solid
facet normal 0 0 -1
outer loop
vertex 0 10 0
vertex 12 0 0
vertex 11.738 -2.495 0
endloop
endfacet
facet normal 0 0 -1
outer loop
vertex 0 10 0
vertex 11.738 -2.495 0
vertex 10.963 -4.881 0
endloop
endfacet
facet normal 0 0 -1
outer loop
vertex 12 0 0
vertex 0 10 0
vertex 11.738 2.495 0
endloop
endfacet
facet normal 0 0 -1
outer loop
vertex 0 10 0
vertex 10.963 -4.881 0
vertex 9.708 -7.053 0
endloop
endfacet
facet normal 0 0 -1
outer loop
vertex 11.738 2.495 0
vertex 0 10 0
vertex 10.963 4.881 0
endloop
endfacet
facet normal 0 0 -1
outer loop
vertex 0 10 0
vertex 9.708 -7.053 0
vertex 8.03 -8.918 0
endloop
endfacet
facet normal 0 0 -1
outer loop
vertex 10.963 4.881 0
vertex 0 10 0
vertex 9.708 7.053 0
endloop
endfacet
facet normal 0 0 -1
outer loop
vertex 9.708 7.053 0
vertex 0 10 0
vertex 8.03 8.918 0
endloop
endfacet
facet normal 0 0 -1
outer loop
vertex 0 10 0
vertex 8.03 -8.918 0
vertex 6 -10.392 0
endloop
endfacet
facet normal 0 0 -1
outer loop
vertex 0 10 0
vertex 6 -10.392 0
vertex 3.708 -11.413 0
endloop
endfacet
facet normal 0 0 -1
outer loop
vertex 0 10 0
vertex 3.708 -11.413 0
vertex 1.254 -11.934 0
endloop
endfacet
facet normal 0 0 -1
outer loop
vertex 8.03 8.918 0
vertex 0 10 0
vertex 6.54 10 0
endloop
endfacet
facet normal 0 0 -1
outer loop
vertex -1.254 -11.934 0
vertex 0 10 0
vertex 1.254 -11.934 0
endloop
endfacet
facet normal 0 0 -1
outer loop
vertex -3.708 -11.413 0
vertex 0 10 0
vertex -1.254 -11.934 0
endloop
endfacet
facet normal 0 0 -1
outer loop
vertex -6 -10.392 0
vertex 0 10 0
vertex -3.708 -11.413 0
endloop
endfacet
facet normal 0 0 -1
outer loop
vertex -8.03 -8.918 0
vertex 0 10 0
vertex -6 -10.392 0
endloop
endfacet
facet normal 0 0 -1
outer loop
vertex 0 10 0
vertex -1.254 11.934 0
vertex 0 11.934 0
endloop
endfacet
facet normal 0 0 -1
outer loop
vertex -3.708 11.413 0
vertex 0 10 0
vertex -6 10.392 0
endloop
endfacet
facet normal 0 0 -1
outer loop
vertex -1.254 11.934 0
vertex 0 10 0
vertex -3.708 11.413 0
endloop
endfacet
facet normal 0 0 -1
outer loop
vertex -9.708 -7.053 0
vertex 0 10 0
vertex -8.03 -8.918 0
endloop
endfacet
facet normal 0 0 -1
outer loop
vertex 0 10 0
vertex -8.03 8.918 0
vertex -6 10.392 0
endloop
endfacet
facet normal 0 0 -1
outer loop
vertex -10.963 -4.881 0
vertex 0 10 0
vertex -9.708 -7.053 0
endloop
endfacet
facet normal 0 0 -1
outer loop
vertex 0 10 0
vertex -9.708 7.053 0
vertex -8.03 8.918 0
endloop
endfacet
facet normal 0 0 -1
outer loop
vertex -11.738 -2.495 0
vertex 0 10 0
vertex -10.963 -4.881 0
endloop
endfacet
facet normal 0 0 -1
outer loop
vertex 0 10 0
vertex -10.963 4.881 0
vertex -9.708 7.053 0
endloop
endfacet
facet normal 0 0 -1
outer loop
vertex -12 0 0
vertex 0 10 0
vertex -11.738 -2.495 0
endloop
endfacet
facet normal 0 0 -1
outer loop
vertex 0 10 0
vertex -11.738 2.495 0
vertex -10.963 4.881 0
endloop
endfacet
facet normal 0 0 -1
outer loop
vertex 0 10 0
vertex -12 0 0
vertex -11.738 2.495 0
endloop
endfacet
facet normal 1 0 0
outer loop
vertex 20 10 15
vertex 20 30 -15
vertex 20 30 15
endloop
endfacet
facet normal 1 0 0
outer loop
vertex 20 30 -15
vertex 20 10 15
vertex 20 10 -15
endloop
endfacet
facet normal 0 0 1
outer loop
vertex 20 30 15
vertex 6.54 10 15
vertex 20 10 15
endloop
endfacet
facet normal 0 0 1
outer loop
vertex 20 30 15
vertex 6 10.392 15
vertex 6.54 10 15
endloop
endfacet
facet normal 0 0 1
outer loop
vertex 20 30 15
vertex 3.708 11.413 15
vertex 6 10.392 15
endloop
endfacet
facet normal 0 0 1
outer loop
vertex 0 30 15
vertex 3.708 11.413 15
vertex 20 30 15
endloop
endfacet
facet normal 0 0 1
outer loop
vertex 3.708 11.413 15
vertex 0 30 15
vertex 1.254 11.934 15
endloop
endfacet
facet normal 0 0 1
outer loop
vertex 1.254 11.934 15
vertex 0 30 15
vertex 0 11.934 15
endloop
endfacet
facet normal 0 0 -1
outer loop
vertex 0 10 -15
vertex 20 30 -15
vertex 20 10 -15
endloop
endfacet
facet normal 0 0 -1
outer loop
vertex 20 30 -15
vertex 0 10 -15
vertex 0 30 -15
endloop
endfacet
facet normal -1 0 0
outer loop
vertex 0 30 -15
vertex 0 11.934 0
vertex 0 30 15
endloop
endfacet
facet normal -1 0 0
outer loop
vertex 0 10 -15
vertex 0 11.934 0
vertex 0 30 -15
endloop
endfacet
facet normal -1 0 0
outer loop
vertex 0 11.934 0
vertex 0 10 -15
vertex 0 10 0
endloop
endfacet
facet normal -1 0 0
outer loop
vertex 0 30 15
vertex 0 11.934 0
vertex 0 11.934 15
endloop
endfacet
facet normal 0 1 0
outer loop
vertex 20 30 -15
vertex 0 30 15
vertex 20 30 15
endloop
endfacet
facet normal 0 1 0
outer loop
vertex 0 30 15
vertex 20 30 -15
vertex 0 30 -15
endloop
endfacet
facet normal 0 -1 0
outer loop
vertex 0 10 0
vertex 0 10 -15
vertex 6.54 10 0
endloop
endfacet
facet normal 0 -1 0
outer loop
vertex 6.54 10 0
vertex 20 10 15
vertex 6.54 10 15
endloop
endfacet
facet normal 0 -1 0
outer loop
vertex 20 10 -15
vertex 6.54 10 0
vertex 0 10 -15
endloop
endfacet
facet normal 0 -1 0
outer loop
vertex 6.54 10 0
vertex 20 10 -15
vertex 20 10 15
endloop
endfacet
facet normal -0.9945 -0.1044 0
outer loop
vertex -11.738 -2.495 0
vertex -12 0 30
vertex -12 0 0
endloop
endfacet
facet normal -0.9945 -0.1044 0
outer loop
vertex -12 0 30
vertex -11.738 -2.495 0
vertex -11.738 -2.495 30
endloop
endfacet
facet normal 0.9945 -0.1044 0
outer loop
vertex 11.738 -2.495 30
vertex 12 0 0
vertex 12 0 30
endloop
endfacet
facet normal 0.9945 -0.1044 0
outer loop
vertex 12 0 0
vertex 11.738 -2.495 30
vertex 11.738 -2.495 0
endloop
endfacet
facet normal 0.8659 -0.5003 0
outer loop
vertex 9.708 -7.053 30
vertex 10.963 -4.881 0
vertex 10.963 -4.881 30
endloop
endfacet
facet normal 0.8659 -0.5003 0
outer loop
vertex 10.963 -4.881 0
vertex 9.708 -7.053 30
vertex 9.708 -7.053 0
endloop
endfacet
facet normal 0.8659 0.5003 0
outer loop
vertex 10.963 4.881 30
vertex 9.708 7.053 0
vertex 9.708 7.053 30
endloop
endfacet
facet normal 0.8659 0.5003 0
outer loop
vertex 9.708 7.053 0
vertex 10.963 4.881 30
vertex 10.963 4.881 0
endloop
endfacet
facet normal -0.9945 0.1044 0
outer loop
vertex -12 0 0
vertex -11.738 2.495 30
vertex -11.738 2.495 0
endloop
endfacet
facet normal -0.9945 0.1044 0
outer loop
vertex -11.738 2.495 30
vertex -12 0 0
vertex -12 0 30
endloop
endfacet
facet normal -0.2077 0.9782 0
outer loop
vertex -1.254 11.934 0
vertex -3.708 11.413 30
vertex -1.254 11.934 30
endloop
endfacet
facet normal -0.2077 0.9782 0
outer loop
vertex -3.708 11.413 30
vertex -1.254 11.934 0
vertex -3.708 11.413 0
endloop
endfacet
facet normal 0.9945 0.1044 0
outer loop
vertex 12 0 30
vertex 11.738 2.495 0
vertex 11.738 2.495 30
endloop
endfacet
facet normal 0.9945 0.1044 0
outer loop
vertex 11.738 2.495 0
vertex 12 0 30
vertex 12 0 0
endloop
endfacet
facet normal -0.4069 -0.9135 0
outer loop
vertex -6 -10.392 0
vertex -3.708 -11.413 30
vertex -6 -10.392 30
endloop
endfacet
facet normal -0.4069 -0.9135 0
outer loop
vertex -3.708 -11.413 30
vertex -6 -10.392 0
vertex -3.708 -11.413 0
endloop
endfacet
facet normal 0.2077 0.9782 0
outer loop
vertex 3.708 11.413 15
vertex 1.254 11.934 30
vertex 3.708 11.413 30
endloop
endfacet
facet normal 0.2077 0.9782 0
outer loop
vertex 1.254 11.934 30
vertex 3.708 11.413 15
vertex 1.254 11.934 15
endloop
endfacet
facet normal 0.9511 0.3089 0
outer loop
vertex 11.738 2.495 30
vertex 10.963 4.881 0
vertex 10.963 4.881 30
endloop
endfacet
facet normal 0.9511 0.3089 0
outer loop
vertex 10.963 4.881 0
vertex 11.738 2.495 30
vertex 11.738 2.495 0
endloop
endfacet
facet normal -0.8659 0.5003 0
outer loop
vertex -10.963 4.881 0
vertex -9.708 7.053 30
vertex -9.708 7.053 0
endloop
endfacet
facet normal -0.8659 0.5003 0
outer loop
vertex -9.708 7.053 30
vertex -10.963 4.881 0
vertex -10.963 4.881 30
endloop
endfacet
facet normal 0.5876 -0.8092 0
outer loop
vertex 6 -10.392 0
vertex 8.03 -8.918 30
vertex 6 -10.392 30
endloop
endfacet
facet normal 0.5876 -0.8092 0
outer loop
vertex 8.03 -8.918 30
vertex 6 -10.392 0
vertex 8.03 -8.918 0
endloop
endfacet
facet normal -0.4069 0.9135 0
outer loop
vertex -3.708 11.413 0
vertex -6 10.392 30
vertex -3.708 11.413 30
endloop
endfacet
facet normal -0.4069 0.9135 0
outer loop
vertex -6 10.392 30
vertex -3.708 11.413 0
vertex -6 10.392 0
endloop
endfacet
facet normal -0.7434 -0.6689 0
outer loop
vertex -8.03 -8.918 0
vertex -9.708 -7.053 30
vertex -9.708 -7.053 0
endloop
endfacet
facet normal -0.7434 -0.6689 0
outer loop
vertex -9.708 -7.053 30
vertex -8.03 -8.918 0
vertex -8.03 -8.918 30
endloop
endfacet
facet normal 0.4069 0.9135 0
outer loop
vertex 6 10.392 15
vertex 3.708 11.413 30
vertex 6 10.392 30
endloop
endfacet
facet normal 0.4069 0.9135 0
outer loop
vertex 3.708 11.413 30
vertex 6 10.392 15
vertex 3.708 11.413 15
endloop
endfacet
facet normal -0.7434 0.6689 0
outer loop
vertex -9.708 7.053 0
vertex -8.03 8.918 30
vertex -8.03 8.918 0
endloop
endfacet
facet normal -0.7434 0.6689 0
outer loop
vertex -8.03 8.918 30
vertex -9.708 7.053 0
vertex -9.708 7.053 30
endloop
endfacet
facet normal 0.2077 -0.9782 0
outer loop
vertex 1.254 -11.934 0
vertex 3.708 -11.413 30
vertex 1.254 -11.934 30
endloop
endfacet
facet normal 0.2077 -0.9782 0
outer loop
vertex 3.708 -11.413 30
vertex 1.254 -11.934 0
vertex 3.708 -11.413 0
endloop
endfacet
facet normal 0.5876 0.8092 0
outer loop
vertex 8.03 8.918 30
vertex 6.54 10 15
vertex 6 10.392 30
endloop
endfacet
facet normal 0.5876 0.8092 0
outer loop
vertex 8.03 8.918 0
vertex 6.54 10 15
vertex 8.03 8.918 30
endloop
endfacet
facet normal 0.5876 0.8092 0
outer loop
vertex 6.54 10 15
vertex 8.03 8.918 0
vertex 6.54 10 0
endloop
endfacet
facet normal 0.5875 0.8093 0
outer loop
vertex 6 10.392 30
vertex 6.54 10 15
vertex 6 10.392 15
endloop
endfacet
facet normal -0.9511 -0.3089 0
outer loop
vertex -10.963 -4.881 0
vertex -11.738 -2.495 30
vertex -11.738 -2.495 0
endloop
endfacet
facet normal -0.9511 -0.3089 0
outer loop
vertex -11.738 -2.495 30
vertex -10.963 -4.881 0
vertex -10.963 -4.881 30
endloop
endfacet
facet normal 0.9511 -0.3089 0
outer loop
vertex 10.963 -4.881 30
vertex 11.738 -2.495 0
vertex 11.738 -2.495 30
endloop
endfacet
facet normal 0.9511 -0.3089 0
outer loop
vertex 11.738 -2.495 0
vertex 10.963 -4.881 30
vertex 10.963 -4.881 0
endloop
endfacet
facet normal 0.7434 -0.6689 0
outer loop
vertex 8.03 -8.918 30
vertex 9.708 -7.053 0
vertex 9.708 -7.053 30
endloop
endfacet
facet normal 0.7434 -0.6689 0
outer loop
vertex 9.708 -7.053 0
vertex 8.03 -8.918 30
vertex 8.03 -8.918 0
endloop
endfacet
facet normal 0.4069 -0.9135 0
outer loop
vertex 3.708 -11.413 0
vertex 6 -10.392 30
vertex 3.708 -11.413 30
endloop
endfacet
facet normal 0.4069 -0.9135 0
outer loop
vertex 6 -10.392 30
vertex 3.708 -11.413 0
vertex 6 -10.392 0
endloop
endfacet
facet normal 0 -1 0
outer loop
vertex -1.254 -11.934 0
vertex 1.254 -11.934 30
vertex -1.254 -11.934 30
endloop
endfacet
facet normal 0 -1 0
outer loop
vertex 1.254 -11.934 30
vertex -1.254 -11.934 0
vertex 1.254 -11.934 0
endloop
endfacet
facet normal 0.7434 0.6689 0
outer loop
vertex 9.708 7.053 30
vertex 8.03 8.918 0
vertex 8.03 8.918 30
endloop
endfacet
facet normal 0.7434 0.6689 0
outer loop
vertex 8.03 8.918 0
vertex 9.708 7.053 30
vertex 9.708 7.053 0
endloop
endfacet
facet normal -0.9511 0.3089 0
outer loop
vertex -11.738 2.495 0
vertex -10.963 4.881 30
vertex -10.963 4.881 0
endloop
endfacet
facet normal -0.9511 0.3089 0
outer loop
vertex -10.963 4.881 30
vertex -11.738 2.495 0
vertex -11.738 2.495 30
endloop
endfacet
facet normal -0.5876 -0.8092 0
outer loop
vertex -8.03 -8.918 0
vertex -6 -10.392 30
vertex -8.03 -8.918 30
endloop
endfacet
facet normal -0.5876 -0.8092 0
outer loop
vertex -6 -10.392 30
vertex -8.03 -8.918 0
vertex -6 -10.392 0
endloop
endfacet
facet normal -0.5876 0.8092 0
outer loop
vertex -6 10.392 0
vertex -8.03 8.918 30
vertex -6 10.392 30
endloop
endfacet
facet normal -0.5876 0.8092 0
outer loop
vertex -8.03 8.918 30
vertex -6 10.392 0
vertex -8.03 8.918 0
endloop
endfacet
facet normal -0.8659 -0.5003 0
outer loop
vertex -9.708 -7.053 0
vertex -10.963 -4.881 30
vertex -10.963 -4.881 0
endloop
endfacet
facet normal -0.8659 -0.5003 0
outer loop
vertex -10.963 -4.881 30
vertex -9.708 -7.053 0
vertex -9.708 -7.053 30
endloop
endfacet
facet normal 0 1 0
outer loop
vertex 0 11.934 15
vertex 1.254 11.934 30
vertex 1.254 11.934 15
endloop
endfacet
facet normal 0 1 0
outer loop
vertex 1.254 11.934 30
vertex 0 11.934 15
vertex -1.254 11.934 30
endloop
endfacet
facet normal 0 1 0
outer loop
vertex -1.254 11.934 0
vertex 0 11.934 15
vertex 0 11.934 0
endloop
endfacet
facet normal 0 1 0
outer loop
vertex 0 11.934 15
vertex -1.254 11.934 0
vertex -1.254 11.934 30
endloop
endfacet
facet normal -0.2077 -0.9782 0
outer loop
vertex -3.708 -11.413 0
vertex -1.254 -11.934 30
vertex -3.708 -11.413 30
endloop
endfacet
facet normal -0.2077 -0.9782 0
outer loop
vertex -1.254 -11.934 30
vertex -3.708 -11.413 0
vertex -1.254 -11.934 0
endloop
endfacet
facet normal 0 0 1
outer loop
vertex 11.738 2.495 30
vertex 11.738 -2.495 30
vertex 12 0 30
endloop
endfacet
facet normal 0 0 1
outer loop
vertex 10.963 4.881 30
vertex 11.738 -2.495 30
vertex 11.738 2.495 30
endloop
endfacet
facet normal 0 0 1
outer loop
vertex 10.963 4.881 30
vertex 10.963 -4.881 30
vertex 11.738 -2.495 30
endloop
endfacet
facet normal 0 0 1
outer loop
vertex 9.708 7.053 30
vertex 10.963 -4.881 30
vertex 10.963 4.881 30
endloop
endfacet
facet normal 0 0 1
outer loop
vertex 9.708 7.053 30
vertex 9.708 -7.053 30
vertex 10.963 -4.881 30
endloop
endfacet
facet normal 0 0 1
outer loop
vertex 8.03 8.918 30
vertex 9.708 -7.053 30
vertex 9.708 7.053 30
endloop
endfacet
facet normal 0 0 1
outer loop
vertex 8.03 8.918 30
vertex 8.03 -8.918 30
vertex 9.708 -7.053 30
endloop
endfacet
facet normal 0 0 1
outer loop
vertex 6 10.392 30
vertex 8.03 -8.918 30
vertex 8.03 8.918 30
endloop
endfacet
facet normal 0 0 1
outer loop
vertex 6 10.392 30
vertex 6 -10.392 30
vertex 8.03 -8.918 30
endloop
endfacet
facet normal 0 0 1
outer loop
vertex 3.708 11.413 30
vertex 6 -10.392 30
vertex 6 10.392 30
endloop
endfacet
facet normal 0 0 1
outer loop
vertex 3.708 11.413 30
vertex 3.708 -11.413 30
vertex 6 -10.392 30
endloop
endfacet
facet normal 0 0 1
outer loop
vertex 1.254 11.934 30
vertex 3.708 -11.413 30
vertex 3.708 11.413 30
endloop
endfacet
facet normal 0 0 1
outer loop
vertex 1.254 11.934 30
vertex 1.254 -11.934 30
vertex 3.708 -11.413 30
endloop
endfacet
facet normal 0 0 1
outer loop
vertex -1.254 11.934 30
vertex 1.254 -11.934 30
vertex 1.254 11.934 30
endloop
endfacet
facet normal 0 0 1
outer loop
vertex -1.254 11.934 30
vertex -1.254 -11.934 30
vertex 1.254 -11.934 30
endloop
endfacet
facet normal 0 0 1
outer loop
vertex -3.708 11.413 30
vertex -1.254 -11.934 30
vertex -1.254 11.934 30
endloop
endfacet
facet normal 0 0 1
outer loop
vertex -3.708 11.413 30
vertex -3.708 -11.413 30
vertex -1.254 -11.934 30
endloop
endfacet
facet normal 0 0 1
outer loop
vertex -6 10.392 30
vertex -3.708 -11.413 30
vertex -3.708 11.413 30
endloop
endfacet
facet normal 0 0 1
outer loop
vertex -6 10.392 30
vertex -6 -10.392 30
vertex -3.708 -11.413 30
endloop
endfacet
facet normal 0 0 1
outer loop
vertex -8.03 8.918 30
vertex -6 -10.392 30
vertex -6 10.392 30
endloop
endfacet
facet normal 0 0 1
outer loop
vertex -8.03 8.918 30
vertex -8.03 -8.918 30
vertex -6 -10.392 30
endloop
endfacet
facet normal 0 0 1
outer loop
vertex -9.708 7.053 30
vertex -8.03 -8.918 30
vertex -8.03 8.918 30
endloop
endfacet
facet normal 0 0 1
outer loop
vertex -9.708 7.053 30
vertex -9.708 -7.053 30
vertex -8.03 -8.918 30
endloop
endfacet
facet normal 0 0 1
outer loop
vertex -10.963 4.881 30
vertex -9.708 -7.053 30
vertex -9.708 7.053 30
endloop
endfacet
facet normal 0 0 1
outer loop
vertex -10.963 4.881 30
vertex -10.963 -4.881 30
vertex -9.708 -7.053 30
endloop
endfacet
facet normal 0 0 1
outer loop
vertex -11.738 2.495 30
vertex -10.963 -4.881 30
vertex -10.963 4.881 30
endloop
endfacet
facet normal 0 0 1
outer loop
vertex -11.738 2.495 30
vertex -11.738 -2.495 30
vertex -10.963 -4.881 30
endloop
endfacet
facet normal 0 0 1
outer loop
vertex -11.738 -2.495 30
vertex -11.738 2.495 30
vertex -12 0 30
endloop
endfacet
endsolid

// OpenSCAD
// Generated by generate_scads.py
union() {
  translate([10,20,0]) {
    cube(size=[20,20,30], center=true);
  }
  intersection() {
    sphere(r=10);
    cube(size=[30,10,5], center=true);
    sphere(r=6);
    cylinder(h=30, r=6, center=false);
  }
  cylinder(h=30, r=12, center=false);
}
